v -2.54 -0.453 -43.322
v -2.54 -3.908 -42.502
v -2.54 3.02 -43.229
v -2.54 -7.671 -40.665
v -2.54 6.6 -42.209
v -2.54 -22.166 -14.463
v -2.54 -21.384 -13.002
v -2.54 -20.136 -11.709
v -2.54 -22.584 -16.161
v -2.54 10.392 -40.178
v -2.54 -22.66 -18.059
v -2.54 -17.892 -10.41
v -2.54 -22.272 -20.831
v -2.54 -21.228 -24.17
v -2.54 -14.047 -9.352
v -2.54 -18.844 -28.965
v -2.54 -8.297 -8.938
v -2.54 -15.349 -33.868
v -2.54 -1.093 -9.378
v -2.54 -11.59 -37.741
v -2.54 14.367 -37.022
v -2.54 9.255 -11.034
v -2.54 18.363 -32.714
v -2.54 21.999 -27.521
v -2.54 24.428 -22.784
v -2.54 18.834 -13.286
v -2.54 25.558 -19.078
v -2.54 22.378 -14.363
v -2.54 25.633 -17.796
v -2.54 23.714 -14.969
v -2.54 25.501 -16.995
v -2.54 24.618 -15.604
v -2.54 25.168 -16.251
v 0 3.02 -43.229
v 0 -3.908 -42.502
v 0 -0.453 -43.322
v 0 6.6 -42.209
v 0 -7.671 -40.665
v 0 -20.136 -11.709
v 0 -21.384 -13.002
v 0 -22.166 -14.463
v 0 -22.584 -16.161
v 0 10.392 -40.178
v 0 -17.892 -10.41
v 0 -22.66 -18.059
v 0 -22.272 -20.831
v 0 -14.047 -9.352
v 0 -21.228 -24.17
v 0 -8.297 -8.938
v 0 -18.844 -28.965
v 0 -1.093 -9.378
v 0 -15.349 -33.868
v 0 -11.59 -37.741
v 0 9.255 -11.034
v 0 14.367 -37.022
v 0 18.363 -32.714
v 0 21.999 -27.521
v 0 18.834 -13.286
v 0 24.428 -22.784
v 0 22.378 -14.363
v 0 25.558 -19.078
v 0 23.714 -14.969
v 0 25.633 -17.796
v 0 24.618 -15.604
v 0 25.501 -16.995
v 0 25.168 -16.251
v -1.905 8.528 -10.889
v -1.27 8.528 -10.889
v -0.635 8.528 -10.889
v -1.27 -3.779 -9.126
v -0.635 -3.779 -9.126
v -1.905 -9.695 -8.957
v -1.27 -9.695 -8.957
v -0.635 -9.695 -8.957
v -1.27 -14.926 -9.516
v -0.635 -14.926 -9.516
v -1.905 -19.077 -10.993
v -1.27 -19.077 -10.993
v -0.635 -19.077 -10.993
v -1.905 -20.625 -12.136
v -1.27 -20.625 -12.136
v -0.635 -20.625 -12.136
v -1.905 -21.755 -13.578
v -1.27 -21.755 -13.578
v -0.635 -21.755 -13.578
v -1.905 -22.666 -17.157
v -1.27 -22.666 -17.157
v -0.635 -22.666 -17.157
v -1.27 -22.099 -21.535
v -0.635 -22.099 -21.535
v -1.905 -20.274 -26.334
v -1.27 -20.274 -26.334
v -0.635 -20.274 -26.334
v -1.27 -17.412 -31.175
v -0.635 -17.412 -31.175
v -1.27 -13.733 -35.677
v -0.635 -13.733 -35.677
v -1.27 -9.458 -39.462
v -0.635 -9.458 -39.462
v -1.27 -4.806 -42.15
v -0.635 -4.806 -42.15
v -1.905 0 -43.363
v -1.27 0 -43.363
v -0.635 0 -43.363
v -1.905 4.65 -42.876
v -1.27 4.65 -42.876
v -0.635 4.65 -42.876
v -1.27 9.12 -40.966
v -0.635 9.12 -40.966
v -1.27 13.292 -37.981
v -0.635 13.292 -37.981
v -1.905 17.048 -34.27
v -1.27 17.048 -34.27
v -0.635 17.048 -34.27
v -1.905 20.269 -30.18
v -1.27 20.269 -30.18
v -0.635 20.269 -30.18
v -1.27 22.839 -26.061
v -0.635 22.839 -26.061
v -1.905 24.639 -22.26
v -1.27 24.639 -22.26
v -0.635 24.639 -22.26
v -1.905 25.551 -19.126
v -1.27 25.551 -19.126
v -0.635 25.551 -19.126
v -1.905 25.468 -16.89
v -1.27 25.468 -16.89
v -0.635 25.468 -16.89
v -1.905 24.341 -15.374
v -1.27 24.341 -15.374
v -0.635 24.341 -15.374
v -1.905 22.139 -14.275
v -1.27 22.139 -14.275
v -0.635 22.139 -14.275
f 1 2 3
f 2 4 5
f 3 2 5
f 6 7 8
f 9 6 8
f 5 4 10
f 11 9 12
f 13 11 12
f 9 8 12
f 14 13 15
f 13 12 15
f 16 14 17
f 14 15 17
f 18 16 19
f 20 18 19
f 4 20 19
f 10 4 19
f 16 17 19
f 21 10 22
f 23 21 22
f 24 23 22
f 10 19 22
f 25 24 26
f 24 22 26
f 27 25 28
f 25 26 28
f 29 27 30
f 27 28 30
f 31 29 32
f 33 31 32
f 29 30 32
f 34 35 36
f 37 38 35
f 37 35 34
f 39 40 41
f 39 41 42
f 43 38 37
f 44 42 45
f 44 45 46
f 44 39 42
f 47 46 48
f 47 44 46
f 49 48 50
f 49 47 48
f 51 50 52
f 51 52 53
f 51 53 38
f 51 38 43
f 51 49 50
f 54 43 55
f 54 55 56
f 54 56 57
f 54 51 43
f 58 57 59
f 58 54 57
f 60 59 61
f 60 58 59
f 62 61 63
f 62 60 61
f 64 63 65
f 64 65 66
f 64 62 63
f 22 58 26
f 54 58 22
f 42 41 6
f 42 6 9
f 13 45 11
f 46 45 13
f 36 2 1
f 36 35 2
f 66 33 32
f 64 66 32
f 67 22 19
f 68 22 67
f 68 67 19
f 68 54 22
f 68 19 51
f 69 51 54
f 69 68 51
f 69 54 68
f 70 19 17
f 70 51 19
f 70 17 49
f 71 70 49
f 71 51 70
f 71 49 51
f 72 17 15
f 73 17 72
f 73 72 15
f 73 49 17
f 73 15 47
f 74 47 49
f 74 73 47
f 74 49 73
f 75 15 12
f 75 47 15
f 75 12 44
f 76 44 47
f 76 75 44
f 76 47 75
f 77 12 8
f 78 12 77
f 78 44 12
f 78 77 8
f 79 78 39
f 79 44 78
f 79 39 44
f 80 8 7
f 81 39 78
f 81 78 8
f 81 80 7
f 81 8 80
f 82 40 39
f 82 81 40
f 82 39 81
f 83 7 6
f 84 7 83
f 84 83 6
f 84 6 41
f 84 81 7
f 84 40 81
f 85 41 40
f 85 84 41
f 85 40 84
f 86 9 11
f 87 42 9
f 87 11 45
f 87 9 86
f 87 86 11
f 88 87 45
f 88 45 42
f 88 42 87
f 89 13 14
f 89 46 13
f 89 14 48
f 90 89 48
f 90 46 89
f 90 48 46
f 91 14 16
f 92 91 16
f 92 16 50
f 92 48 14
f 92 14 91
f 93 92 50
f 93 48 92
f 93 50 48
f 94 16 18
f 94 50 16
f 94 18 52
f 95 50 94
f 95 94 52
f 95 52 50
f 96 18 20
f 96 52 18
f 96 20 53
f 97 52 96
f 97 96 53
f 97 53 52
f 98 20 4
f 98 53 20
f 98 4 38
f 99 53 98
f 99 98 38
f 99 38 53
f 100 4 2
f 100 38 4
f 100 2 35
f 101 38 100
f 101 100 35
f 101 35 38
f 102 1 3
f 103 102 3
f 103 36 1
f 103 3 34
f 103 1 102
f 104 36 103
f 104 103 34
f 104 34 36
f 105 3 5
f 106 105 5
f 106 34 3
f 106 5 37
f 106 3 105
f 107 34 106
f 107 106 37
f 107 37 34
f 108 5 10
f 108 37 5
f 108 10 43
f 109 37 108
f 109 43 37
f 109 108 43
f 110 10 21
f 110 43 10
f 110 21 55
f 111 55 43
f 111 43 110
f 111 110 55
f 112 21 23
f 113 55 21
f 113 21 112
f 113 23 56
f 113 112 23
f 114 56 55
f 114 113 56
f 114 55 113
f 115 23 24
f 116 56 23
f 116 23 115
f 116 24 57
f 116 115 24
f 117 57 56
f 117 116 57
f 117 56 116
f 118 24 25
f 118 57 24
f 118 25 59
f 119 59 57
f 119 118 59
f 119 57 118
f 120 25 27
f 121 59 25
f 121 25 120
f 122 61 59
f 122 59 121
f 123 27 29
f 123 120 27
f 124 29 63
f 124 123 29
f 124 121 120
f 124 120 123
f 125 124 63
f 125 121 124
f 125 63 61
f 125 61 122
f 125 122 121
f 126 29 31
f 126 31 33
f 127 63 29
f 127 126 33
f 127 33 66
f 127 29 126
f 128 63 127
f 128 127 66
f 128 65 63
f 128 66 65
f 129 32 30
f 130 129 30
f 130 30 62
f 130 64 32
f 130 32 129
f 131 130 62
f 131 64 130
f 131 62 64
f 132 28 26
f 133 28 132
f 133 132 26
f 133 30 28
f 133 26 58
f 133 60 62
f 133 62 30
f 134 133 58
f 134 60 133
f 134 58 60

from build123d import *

# Parameters (mm, degrees)
F1_DEPTH = 2.54
F4_DEPTH = 2.54


with BuildPart() as f1:
    # F0 (on Front) → F1 (new body)
    with BuildSketch(Plane.XZ):
        Polygon((39.0037801344, -25.0662074544), (46.3638827205, 0), (39.0037801344, 25.0662074544), (19.2602529431, 42.1740711514), (-6.5982684711, 45.8919652456), (-30.3618862669, 35.0394846314), (-44.4858196998, 13.0622152239), (-44.4858196998, -13.0622152239), (-30.3618862669, -35.0394846314), (-6.5982684711, -45.8919652456), (19.2602529431, -42.1740711514), align=None)
    extrude(amount=F1_DEPTH)


with BuildPart() as f4:
    # F3 (on Right) → F4 (new body)
    with BuildSketch(Plane.YZ):
        with BuildLine():
            add(Edge.make_bspline(
                [(18.8344698399, -13.2863391191), (7.8289426418, -10.3412201612), (-40.536696967, 0.0143071379), (0.3851135743, -62.6771033415), (30.376378588, -17.2432031362), (23.9879630476, -14.6654325757), (18.8344698399, -13.2863391191)],
                knots=[0, 0, 0, 0, 0.2982422459, 0.5825411858, 0.8603438653, 1, 1, 1, 1], degree=3))
        make_face()
    extrude(amount=-F4_DEPTH)


solid = f4.part
